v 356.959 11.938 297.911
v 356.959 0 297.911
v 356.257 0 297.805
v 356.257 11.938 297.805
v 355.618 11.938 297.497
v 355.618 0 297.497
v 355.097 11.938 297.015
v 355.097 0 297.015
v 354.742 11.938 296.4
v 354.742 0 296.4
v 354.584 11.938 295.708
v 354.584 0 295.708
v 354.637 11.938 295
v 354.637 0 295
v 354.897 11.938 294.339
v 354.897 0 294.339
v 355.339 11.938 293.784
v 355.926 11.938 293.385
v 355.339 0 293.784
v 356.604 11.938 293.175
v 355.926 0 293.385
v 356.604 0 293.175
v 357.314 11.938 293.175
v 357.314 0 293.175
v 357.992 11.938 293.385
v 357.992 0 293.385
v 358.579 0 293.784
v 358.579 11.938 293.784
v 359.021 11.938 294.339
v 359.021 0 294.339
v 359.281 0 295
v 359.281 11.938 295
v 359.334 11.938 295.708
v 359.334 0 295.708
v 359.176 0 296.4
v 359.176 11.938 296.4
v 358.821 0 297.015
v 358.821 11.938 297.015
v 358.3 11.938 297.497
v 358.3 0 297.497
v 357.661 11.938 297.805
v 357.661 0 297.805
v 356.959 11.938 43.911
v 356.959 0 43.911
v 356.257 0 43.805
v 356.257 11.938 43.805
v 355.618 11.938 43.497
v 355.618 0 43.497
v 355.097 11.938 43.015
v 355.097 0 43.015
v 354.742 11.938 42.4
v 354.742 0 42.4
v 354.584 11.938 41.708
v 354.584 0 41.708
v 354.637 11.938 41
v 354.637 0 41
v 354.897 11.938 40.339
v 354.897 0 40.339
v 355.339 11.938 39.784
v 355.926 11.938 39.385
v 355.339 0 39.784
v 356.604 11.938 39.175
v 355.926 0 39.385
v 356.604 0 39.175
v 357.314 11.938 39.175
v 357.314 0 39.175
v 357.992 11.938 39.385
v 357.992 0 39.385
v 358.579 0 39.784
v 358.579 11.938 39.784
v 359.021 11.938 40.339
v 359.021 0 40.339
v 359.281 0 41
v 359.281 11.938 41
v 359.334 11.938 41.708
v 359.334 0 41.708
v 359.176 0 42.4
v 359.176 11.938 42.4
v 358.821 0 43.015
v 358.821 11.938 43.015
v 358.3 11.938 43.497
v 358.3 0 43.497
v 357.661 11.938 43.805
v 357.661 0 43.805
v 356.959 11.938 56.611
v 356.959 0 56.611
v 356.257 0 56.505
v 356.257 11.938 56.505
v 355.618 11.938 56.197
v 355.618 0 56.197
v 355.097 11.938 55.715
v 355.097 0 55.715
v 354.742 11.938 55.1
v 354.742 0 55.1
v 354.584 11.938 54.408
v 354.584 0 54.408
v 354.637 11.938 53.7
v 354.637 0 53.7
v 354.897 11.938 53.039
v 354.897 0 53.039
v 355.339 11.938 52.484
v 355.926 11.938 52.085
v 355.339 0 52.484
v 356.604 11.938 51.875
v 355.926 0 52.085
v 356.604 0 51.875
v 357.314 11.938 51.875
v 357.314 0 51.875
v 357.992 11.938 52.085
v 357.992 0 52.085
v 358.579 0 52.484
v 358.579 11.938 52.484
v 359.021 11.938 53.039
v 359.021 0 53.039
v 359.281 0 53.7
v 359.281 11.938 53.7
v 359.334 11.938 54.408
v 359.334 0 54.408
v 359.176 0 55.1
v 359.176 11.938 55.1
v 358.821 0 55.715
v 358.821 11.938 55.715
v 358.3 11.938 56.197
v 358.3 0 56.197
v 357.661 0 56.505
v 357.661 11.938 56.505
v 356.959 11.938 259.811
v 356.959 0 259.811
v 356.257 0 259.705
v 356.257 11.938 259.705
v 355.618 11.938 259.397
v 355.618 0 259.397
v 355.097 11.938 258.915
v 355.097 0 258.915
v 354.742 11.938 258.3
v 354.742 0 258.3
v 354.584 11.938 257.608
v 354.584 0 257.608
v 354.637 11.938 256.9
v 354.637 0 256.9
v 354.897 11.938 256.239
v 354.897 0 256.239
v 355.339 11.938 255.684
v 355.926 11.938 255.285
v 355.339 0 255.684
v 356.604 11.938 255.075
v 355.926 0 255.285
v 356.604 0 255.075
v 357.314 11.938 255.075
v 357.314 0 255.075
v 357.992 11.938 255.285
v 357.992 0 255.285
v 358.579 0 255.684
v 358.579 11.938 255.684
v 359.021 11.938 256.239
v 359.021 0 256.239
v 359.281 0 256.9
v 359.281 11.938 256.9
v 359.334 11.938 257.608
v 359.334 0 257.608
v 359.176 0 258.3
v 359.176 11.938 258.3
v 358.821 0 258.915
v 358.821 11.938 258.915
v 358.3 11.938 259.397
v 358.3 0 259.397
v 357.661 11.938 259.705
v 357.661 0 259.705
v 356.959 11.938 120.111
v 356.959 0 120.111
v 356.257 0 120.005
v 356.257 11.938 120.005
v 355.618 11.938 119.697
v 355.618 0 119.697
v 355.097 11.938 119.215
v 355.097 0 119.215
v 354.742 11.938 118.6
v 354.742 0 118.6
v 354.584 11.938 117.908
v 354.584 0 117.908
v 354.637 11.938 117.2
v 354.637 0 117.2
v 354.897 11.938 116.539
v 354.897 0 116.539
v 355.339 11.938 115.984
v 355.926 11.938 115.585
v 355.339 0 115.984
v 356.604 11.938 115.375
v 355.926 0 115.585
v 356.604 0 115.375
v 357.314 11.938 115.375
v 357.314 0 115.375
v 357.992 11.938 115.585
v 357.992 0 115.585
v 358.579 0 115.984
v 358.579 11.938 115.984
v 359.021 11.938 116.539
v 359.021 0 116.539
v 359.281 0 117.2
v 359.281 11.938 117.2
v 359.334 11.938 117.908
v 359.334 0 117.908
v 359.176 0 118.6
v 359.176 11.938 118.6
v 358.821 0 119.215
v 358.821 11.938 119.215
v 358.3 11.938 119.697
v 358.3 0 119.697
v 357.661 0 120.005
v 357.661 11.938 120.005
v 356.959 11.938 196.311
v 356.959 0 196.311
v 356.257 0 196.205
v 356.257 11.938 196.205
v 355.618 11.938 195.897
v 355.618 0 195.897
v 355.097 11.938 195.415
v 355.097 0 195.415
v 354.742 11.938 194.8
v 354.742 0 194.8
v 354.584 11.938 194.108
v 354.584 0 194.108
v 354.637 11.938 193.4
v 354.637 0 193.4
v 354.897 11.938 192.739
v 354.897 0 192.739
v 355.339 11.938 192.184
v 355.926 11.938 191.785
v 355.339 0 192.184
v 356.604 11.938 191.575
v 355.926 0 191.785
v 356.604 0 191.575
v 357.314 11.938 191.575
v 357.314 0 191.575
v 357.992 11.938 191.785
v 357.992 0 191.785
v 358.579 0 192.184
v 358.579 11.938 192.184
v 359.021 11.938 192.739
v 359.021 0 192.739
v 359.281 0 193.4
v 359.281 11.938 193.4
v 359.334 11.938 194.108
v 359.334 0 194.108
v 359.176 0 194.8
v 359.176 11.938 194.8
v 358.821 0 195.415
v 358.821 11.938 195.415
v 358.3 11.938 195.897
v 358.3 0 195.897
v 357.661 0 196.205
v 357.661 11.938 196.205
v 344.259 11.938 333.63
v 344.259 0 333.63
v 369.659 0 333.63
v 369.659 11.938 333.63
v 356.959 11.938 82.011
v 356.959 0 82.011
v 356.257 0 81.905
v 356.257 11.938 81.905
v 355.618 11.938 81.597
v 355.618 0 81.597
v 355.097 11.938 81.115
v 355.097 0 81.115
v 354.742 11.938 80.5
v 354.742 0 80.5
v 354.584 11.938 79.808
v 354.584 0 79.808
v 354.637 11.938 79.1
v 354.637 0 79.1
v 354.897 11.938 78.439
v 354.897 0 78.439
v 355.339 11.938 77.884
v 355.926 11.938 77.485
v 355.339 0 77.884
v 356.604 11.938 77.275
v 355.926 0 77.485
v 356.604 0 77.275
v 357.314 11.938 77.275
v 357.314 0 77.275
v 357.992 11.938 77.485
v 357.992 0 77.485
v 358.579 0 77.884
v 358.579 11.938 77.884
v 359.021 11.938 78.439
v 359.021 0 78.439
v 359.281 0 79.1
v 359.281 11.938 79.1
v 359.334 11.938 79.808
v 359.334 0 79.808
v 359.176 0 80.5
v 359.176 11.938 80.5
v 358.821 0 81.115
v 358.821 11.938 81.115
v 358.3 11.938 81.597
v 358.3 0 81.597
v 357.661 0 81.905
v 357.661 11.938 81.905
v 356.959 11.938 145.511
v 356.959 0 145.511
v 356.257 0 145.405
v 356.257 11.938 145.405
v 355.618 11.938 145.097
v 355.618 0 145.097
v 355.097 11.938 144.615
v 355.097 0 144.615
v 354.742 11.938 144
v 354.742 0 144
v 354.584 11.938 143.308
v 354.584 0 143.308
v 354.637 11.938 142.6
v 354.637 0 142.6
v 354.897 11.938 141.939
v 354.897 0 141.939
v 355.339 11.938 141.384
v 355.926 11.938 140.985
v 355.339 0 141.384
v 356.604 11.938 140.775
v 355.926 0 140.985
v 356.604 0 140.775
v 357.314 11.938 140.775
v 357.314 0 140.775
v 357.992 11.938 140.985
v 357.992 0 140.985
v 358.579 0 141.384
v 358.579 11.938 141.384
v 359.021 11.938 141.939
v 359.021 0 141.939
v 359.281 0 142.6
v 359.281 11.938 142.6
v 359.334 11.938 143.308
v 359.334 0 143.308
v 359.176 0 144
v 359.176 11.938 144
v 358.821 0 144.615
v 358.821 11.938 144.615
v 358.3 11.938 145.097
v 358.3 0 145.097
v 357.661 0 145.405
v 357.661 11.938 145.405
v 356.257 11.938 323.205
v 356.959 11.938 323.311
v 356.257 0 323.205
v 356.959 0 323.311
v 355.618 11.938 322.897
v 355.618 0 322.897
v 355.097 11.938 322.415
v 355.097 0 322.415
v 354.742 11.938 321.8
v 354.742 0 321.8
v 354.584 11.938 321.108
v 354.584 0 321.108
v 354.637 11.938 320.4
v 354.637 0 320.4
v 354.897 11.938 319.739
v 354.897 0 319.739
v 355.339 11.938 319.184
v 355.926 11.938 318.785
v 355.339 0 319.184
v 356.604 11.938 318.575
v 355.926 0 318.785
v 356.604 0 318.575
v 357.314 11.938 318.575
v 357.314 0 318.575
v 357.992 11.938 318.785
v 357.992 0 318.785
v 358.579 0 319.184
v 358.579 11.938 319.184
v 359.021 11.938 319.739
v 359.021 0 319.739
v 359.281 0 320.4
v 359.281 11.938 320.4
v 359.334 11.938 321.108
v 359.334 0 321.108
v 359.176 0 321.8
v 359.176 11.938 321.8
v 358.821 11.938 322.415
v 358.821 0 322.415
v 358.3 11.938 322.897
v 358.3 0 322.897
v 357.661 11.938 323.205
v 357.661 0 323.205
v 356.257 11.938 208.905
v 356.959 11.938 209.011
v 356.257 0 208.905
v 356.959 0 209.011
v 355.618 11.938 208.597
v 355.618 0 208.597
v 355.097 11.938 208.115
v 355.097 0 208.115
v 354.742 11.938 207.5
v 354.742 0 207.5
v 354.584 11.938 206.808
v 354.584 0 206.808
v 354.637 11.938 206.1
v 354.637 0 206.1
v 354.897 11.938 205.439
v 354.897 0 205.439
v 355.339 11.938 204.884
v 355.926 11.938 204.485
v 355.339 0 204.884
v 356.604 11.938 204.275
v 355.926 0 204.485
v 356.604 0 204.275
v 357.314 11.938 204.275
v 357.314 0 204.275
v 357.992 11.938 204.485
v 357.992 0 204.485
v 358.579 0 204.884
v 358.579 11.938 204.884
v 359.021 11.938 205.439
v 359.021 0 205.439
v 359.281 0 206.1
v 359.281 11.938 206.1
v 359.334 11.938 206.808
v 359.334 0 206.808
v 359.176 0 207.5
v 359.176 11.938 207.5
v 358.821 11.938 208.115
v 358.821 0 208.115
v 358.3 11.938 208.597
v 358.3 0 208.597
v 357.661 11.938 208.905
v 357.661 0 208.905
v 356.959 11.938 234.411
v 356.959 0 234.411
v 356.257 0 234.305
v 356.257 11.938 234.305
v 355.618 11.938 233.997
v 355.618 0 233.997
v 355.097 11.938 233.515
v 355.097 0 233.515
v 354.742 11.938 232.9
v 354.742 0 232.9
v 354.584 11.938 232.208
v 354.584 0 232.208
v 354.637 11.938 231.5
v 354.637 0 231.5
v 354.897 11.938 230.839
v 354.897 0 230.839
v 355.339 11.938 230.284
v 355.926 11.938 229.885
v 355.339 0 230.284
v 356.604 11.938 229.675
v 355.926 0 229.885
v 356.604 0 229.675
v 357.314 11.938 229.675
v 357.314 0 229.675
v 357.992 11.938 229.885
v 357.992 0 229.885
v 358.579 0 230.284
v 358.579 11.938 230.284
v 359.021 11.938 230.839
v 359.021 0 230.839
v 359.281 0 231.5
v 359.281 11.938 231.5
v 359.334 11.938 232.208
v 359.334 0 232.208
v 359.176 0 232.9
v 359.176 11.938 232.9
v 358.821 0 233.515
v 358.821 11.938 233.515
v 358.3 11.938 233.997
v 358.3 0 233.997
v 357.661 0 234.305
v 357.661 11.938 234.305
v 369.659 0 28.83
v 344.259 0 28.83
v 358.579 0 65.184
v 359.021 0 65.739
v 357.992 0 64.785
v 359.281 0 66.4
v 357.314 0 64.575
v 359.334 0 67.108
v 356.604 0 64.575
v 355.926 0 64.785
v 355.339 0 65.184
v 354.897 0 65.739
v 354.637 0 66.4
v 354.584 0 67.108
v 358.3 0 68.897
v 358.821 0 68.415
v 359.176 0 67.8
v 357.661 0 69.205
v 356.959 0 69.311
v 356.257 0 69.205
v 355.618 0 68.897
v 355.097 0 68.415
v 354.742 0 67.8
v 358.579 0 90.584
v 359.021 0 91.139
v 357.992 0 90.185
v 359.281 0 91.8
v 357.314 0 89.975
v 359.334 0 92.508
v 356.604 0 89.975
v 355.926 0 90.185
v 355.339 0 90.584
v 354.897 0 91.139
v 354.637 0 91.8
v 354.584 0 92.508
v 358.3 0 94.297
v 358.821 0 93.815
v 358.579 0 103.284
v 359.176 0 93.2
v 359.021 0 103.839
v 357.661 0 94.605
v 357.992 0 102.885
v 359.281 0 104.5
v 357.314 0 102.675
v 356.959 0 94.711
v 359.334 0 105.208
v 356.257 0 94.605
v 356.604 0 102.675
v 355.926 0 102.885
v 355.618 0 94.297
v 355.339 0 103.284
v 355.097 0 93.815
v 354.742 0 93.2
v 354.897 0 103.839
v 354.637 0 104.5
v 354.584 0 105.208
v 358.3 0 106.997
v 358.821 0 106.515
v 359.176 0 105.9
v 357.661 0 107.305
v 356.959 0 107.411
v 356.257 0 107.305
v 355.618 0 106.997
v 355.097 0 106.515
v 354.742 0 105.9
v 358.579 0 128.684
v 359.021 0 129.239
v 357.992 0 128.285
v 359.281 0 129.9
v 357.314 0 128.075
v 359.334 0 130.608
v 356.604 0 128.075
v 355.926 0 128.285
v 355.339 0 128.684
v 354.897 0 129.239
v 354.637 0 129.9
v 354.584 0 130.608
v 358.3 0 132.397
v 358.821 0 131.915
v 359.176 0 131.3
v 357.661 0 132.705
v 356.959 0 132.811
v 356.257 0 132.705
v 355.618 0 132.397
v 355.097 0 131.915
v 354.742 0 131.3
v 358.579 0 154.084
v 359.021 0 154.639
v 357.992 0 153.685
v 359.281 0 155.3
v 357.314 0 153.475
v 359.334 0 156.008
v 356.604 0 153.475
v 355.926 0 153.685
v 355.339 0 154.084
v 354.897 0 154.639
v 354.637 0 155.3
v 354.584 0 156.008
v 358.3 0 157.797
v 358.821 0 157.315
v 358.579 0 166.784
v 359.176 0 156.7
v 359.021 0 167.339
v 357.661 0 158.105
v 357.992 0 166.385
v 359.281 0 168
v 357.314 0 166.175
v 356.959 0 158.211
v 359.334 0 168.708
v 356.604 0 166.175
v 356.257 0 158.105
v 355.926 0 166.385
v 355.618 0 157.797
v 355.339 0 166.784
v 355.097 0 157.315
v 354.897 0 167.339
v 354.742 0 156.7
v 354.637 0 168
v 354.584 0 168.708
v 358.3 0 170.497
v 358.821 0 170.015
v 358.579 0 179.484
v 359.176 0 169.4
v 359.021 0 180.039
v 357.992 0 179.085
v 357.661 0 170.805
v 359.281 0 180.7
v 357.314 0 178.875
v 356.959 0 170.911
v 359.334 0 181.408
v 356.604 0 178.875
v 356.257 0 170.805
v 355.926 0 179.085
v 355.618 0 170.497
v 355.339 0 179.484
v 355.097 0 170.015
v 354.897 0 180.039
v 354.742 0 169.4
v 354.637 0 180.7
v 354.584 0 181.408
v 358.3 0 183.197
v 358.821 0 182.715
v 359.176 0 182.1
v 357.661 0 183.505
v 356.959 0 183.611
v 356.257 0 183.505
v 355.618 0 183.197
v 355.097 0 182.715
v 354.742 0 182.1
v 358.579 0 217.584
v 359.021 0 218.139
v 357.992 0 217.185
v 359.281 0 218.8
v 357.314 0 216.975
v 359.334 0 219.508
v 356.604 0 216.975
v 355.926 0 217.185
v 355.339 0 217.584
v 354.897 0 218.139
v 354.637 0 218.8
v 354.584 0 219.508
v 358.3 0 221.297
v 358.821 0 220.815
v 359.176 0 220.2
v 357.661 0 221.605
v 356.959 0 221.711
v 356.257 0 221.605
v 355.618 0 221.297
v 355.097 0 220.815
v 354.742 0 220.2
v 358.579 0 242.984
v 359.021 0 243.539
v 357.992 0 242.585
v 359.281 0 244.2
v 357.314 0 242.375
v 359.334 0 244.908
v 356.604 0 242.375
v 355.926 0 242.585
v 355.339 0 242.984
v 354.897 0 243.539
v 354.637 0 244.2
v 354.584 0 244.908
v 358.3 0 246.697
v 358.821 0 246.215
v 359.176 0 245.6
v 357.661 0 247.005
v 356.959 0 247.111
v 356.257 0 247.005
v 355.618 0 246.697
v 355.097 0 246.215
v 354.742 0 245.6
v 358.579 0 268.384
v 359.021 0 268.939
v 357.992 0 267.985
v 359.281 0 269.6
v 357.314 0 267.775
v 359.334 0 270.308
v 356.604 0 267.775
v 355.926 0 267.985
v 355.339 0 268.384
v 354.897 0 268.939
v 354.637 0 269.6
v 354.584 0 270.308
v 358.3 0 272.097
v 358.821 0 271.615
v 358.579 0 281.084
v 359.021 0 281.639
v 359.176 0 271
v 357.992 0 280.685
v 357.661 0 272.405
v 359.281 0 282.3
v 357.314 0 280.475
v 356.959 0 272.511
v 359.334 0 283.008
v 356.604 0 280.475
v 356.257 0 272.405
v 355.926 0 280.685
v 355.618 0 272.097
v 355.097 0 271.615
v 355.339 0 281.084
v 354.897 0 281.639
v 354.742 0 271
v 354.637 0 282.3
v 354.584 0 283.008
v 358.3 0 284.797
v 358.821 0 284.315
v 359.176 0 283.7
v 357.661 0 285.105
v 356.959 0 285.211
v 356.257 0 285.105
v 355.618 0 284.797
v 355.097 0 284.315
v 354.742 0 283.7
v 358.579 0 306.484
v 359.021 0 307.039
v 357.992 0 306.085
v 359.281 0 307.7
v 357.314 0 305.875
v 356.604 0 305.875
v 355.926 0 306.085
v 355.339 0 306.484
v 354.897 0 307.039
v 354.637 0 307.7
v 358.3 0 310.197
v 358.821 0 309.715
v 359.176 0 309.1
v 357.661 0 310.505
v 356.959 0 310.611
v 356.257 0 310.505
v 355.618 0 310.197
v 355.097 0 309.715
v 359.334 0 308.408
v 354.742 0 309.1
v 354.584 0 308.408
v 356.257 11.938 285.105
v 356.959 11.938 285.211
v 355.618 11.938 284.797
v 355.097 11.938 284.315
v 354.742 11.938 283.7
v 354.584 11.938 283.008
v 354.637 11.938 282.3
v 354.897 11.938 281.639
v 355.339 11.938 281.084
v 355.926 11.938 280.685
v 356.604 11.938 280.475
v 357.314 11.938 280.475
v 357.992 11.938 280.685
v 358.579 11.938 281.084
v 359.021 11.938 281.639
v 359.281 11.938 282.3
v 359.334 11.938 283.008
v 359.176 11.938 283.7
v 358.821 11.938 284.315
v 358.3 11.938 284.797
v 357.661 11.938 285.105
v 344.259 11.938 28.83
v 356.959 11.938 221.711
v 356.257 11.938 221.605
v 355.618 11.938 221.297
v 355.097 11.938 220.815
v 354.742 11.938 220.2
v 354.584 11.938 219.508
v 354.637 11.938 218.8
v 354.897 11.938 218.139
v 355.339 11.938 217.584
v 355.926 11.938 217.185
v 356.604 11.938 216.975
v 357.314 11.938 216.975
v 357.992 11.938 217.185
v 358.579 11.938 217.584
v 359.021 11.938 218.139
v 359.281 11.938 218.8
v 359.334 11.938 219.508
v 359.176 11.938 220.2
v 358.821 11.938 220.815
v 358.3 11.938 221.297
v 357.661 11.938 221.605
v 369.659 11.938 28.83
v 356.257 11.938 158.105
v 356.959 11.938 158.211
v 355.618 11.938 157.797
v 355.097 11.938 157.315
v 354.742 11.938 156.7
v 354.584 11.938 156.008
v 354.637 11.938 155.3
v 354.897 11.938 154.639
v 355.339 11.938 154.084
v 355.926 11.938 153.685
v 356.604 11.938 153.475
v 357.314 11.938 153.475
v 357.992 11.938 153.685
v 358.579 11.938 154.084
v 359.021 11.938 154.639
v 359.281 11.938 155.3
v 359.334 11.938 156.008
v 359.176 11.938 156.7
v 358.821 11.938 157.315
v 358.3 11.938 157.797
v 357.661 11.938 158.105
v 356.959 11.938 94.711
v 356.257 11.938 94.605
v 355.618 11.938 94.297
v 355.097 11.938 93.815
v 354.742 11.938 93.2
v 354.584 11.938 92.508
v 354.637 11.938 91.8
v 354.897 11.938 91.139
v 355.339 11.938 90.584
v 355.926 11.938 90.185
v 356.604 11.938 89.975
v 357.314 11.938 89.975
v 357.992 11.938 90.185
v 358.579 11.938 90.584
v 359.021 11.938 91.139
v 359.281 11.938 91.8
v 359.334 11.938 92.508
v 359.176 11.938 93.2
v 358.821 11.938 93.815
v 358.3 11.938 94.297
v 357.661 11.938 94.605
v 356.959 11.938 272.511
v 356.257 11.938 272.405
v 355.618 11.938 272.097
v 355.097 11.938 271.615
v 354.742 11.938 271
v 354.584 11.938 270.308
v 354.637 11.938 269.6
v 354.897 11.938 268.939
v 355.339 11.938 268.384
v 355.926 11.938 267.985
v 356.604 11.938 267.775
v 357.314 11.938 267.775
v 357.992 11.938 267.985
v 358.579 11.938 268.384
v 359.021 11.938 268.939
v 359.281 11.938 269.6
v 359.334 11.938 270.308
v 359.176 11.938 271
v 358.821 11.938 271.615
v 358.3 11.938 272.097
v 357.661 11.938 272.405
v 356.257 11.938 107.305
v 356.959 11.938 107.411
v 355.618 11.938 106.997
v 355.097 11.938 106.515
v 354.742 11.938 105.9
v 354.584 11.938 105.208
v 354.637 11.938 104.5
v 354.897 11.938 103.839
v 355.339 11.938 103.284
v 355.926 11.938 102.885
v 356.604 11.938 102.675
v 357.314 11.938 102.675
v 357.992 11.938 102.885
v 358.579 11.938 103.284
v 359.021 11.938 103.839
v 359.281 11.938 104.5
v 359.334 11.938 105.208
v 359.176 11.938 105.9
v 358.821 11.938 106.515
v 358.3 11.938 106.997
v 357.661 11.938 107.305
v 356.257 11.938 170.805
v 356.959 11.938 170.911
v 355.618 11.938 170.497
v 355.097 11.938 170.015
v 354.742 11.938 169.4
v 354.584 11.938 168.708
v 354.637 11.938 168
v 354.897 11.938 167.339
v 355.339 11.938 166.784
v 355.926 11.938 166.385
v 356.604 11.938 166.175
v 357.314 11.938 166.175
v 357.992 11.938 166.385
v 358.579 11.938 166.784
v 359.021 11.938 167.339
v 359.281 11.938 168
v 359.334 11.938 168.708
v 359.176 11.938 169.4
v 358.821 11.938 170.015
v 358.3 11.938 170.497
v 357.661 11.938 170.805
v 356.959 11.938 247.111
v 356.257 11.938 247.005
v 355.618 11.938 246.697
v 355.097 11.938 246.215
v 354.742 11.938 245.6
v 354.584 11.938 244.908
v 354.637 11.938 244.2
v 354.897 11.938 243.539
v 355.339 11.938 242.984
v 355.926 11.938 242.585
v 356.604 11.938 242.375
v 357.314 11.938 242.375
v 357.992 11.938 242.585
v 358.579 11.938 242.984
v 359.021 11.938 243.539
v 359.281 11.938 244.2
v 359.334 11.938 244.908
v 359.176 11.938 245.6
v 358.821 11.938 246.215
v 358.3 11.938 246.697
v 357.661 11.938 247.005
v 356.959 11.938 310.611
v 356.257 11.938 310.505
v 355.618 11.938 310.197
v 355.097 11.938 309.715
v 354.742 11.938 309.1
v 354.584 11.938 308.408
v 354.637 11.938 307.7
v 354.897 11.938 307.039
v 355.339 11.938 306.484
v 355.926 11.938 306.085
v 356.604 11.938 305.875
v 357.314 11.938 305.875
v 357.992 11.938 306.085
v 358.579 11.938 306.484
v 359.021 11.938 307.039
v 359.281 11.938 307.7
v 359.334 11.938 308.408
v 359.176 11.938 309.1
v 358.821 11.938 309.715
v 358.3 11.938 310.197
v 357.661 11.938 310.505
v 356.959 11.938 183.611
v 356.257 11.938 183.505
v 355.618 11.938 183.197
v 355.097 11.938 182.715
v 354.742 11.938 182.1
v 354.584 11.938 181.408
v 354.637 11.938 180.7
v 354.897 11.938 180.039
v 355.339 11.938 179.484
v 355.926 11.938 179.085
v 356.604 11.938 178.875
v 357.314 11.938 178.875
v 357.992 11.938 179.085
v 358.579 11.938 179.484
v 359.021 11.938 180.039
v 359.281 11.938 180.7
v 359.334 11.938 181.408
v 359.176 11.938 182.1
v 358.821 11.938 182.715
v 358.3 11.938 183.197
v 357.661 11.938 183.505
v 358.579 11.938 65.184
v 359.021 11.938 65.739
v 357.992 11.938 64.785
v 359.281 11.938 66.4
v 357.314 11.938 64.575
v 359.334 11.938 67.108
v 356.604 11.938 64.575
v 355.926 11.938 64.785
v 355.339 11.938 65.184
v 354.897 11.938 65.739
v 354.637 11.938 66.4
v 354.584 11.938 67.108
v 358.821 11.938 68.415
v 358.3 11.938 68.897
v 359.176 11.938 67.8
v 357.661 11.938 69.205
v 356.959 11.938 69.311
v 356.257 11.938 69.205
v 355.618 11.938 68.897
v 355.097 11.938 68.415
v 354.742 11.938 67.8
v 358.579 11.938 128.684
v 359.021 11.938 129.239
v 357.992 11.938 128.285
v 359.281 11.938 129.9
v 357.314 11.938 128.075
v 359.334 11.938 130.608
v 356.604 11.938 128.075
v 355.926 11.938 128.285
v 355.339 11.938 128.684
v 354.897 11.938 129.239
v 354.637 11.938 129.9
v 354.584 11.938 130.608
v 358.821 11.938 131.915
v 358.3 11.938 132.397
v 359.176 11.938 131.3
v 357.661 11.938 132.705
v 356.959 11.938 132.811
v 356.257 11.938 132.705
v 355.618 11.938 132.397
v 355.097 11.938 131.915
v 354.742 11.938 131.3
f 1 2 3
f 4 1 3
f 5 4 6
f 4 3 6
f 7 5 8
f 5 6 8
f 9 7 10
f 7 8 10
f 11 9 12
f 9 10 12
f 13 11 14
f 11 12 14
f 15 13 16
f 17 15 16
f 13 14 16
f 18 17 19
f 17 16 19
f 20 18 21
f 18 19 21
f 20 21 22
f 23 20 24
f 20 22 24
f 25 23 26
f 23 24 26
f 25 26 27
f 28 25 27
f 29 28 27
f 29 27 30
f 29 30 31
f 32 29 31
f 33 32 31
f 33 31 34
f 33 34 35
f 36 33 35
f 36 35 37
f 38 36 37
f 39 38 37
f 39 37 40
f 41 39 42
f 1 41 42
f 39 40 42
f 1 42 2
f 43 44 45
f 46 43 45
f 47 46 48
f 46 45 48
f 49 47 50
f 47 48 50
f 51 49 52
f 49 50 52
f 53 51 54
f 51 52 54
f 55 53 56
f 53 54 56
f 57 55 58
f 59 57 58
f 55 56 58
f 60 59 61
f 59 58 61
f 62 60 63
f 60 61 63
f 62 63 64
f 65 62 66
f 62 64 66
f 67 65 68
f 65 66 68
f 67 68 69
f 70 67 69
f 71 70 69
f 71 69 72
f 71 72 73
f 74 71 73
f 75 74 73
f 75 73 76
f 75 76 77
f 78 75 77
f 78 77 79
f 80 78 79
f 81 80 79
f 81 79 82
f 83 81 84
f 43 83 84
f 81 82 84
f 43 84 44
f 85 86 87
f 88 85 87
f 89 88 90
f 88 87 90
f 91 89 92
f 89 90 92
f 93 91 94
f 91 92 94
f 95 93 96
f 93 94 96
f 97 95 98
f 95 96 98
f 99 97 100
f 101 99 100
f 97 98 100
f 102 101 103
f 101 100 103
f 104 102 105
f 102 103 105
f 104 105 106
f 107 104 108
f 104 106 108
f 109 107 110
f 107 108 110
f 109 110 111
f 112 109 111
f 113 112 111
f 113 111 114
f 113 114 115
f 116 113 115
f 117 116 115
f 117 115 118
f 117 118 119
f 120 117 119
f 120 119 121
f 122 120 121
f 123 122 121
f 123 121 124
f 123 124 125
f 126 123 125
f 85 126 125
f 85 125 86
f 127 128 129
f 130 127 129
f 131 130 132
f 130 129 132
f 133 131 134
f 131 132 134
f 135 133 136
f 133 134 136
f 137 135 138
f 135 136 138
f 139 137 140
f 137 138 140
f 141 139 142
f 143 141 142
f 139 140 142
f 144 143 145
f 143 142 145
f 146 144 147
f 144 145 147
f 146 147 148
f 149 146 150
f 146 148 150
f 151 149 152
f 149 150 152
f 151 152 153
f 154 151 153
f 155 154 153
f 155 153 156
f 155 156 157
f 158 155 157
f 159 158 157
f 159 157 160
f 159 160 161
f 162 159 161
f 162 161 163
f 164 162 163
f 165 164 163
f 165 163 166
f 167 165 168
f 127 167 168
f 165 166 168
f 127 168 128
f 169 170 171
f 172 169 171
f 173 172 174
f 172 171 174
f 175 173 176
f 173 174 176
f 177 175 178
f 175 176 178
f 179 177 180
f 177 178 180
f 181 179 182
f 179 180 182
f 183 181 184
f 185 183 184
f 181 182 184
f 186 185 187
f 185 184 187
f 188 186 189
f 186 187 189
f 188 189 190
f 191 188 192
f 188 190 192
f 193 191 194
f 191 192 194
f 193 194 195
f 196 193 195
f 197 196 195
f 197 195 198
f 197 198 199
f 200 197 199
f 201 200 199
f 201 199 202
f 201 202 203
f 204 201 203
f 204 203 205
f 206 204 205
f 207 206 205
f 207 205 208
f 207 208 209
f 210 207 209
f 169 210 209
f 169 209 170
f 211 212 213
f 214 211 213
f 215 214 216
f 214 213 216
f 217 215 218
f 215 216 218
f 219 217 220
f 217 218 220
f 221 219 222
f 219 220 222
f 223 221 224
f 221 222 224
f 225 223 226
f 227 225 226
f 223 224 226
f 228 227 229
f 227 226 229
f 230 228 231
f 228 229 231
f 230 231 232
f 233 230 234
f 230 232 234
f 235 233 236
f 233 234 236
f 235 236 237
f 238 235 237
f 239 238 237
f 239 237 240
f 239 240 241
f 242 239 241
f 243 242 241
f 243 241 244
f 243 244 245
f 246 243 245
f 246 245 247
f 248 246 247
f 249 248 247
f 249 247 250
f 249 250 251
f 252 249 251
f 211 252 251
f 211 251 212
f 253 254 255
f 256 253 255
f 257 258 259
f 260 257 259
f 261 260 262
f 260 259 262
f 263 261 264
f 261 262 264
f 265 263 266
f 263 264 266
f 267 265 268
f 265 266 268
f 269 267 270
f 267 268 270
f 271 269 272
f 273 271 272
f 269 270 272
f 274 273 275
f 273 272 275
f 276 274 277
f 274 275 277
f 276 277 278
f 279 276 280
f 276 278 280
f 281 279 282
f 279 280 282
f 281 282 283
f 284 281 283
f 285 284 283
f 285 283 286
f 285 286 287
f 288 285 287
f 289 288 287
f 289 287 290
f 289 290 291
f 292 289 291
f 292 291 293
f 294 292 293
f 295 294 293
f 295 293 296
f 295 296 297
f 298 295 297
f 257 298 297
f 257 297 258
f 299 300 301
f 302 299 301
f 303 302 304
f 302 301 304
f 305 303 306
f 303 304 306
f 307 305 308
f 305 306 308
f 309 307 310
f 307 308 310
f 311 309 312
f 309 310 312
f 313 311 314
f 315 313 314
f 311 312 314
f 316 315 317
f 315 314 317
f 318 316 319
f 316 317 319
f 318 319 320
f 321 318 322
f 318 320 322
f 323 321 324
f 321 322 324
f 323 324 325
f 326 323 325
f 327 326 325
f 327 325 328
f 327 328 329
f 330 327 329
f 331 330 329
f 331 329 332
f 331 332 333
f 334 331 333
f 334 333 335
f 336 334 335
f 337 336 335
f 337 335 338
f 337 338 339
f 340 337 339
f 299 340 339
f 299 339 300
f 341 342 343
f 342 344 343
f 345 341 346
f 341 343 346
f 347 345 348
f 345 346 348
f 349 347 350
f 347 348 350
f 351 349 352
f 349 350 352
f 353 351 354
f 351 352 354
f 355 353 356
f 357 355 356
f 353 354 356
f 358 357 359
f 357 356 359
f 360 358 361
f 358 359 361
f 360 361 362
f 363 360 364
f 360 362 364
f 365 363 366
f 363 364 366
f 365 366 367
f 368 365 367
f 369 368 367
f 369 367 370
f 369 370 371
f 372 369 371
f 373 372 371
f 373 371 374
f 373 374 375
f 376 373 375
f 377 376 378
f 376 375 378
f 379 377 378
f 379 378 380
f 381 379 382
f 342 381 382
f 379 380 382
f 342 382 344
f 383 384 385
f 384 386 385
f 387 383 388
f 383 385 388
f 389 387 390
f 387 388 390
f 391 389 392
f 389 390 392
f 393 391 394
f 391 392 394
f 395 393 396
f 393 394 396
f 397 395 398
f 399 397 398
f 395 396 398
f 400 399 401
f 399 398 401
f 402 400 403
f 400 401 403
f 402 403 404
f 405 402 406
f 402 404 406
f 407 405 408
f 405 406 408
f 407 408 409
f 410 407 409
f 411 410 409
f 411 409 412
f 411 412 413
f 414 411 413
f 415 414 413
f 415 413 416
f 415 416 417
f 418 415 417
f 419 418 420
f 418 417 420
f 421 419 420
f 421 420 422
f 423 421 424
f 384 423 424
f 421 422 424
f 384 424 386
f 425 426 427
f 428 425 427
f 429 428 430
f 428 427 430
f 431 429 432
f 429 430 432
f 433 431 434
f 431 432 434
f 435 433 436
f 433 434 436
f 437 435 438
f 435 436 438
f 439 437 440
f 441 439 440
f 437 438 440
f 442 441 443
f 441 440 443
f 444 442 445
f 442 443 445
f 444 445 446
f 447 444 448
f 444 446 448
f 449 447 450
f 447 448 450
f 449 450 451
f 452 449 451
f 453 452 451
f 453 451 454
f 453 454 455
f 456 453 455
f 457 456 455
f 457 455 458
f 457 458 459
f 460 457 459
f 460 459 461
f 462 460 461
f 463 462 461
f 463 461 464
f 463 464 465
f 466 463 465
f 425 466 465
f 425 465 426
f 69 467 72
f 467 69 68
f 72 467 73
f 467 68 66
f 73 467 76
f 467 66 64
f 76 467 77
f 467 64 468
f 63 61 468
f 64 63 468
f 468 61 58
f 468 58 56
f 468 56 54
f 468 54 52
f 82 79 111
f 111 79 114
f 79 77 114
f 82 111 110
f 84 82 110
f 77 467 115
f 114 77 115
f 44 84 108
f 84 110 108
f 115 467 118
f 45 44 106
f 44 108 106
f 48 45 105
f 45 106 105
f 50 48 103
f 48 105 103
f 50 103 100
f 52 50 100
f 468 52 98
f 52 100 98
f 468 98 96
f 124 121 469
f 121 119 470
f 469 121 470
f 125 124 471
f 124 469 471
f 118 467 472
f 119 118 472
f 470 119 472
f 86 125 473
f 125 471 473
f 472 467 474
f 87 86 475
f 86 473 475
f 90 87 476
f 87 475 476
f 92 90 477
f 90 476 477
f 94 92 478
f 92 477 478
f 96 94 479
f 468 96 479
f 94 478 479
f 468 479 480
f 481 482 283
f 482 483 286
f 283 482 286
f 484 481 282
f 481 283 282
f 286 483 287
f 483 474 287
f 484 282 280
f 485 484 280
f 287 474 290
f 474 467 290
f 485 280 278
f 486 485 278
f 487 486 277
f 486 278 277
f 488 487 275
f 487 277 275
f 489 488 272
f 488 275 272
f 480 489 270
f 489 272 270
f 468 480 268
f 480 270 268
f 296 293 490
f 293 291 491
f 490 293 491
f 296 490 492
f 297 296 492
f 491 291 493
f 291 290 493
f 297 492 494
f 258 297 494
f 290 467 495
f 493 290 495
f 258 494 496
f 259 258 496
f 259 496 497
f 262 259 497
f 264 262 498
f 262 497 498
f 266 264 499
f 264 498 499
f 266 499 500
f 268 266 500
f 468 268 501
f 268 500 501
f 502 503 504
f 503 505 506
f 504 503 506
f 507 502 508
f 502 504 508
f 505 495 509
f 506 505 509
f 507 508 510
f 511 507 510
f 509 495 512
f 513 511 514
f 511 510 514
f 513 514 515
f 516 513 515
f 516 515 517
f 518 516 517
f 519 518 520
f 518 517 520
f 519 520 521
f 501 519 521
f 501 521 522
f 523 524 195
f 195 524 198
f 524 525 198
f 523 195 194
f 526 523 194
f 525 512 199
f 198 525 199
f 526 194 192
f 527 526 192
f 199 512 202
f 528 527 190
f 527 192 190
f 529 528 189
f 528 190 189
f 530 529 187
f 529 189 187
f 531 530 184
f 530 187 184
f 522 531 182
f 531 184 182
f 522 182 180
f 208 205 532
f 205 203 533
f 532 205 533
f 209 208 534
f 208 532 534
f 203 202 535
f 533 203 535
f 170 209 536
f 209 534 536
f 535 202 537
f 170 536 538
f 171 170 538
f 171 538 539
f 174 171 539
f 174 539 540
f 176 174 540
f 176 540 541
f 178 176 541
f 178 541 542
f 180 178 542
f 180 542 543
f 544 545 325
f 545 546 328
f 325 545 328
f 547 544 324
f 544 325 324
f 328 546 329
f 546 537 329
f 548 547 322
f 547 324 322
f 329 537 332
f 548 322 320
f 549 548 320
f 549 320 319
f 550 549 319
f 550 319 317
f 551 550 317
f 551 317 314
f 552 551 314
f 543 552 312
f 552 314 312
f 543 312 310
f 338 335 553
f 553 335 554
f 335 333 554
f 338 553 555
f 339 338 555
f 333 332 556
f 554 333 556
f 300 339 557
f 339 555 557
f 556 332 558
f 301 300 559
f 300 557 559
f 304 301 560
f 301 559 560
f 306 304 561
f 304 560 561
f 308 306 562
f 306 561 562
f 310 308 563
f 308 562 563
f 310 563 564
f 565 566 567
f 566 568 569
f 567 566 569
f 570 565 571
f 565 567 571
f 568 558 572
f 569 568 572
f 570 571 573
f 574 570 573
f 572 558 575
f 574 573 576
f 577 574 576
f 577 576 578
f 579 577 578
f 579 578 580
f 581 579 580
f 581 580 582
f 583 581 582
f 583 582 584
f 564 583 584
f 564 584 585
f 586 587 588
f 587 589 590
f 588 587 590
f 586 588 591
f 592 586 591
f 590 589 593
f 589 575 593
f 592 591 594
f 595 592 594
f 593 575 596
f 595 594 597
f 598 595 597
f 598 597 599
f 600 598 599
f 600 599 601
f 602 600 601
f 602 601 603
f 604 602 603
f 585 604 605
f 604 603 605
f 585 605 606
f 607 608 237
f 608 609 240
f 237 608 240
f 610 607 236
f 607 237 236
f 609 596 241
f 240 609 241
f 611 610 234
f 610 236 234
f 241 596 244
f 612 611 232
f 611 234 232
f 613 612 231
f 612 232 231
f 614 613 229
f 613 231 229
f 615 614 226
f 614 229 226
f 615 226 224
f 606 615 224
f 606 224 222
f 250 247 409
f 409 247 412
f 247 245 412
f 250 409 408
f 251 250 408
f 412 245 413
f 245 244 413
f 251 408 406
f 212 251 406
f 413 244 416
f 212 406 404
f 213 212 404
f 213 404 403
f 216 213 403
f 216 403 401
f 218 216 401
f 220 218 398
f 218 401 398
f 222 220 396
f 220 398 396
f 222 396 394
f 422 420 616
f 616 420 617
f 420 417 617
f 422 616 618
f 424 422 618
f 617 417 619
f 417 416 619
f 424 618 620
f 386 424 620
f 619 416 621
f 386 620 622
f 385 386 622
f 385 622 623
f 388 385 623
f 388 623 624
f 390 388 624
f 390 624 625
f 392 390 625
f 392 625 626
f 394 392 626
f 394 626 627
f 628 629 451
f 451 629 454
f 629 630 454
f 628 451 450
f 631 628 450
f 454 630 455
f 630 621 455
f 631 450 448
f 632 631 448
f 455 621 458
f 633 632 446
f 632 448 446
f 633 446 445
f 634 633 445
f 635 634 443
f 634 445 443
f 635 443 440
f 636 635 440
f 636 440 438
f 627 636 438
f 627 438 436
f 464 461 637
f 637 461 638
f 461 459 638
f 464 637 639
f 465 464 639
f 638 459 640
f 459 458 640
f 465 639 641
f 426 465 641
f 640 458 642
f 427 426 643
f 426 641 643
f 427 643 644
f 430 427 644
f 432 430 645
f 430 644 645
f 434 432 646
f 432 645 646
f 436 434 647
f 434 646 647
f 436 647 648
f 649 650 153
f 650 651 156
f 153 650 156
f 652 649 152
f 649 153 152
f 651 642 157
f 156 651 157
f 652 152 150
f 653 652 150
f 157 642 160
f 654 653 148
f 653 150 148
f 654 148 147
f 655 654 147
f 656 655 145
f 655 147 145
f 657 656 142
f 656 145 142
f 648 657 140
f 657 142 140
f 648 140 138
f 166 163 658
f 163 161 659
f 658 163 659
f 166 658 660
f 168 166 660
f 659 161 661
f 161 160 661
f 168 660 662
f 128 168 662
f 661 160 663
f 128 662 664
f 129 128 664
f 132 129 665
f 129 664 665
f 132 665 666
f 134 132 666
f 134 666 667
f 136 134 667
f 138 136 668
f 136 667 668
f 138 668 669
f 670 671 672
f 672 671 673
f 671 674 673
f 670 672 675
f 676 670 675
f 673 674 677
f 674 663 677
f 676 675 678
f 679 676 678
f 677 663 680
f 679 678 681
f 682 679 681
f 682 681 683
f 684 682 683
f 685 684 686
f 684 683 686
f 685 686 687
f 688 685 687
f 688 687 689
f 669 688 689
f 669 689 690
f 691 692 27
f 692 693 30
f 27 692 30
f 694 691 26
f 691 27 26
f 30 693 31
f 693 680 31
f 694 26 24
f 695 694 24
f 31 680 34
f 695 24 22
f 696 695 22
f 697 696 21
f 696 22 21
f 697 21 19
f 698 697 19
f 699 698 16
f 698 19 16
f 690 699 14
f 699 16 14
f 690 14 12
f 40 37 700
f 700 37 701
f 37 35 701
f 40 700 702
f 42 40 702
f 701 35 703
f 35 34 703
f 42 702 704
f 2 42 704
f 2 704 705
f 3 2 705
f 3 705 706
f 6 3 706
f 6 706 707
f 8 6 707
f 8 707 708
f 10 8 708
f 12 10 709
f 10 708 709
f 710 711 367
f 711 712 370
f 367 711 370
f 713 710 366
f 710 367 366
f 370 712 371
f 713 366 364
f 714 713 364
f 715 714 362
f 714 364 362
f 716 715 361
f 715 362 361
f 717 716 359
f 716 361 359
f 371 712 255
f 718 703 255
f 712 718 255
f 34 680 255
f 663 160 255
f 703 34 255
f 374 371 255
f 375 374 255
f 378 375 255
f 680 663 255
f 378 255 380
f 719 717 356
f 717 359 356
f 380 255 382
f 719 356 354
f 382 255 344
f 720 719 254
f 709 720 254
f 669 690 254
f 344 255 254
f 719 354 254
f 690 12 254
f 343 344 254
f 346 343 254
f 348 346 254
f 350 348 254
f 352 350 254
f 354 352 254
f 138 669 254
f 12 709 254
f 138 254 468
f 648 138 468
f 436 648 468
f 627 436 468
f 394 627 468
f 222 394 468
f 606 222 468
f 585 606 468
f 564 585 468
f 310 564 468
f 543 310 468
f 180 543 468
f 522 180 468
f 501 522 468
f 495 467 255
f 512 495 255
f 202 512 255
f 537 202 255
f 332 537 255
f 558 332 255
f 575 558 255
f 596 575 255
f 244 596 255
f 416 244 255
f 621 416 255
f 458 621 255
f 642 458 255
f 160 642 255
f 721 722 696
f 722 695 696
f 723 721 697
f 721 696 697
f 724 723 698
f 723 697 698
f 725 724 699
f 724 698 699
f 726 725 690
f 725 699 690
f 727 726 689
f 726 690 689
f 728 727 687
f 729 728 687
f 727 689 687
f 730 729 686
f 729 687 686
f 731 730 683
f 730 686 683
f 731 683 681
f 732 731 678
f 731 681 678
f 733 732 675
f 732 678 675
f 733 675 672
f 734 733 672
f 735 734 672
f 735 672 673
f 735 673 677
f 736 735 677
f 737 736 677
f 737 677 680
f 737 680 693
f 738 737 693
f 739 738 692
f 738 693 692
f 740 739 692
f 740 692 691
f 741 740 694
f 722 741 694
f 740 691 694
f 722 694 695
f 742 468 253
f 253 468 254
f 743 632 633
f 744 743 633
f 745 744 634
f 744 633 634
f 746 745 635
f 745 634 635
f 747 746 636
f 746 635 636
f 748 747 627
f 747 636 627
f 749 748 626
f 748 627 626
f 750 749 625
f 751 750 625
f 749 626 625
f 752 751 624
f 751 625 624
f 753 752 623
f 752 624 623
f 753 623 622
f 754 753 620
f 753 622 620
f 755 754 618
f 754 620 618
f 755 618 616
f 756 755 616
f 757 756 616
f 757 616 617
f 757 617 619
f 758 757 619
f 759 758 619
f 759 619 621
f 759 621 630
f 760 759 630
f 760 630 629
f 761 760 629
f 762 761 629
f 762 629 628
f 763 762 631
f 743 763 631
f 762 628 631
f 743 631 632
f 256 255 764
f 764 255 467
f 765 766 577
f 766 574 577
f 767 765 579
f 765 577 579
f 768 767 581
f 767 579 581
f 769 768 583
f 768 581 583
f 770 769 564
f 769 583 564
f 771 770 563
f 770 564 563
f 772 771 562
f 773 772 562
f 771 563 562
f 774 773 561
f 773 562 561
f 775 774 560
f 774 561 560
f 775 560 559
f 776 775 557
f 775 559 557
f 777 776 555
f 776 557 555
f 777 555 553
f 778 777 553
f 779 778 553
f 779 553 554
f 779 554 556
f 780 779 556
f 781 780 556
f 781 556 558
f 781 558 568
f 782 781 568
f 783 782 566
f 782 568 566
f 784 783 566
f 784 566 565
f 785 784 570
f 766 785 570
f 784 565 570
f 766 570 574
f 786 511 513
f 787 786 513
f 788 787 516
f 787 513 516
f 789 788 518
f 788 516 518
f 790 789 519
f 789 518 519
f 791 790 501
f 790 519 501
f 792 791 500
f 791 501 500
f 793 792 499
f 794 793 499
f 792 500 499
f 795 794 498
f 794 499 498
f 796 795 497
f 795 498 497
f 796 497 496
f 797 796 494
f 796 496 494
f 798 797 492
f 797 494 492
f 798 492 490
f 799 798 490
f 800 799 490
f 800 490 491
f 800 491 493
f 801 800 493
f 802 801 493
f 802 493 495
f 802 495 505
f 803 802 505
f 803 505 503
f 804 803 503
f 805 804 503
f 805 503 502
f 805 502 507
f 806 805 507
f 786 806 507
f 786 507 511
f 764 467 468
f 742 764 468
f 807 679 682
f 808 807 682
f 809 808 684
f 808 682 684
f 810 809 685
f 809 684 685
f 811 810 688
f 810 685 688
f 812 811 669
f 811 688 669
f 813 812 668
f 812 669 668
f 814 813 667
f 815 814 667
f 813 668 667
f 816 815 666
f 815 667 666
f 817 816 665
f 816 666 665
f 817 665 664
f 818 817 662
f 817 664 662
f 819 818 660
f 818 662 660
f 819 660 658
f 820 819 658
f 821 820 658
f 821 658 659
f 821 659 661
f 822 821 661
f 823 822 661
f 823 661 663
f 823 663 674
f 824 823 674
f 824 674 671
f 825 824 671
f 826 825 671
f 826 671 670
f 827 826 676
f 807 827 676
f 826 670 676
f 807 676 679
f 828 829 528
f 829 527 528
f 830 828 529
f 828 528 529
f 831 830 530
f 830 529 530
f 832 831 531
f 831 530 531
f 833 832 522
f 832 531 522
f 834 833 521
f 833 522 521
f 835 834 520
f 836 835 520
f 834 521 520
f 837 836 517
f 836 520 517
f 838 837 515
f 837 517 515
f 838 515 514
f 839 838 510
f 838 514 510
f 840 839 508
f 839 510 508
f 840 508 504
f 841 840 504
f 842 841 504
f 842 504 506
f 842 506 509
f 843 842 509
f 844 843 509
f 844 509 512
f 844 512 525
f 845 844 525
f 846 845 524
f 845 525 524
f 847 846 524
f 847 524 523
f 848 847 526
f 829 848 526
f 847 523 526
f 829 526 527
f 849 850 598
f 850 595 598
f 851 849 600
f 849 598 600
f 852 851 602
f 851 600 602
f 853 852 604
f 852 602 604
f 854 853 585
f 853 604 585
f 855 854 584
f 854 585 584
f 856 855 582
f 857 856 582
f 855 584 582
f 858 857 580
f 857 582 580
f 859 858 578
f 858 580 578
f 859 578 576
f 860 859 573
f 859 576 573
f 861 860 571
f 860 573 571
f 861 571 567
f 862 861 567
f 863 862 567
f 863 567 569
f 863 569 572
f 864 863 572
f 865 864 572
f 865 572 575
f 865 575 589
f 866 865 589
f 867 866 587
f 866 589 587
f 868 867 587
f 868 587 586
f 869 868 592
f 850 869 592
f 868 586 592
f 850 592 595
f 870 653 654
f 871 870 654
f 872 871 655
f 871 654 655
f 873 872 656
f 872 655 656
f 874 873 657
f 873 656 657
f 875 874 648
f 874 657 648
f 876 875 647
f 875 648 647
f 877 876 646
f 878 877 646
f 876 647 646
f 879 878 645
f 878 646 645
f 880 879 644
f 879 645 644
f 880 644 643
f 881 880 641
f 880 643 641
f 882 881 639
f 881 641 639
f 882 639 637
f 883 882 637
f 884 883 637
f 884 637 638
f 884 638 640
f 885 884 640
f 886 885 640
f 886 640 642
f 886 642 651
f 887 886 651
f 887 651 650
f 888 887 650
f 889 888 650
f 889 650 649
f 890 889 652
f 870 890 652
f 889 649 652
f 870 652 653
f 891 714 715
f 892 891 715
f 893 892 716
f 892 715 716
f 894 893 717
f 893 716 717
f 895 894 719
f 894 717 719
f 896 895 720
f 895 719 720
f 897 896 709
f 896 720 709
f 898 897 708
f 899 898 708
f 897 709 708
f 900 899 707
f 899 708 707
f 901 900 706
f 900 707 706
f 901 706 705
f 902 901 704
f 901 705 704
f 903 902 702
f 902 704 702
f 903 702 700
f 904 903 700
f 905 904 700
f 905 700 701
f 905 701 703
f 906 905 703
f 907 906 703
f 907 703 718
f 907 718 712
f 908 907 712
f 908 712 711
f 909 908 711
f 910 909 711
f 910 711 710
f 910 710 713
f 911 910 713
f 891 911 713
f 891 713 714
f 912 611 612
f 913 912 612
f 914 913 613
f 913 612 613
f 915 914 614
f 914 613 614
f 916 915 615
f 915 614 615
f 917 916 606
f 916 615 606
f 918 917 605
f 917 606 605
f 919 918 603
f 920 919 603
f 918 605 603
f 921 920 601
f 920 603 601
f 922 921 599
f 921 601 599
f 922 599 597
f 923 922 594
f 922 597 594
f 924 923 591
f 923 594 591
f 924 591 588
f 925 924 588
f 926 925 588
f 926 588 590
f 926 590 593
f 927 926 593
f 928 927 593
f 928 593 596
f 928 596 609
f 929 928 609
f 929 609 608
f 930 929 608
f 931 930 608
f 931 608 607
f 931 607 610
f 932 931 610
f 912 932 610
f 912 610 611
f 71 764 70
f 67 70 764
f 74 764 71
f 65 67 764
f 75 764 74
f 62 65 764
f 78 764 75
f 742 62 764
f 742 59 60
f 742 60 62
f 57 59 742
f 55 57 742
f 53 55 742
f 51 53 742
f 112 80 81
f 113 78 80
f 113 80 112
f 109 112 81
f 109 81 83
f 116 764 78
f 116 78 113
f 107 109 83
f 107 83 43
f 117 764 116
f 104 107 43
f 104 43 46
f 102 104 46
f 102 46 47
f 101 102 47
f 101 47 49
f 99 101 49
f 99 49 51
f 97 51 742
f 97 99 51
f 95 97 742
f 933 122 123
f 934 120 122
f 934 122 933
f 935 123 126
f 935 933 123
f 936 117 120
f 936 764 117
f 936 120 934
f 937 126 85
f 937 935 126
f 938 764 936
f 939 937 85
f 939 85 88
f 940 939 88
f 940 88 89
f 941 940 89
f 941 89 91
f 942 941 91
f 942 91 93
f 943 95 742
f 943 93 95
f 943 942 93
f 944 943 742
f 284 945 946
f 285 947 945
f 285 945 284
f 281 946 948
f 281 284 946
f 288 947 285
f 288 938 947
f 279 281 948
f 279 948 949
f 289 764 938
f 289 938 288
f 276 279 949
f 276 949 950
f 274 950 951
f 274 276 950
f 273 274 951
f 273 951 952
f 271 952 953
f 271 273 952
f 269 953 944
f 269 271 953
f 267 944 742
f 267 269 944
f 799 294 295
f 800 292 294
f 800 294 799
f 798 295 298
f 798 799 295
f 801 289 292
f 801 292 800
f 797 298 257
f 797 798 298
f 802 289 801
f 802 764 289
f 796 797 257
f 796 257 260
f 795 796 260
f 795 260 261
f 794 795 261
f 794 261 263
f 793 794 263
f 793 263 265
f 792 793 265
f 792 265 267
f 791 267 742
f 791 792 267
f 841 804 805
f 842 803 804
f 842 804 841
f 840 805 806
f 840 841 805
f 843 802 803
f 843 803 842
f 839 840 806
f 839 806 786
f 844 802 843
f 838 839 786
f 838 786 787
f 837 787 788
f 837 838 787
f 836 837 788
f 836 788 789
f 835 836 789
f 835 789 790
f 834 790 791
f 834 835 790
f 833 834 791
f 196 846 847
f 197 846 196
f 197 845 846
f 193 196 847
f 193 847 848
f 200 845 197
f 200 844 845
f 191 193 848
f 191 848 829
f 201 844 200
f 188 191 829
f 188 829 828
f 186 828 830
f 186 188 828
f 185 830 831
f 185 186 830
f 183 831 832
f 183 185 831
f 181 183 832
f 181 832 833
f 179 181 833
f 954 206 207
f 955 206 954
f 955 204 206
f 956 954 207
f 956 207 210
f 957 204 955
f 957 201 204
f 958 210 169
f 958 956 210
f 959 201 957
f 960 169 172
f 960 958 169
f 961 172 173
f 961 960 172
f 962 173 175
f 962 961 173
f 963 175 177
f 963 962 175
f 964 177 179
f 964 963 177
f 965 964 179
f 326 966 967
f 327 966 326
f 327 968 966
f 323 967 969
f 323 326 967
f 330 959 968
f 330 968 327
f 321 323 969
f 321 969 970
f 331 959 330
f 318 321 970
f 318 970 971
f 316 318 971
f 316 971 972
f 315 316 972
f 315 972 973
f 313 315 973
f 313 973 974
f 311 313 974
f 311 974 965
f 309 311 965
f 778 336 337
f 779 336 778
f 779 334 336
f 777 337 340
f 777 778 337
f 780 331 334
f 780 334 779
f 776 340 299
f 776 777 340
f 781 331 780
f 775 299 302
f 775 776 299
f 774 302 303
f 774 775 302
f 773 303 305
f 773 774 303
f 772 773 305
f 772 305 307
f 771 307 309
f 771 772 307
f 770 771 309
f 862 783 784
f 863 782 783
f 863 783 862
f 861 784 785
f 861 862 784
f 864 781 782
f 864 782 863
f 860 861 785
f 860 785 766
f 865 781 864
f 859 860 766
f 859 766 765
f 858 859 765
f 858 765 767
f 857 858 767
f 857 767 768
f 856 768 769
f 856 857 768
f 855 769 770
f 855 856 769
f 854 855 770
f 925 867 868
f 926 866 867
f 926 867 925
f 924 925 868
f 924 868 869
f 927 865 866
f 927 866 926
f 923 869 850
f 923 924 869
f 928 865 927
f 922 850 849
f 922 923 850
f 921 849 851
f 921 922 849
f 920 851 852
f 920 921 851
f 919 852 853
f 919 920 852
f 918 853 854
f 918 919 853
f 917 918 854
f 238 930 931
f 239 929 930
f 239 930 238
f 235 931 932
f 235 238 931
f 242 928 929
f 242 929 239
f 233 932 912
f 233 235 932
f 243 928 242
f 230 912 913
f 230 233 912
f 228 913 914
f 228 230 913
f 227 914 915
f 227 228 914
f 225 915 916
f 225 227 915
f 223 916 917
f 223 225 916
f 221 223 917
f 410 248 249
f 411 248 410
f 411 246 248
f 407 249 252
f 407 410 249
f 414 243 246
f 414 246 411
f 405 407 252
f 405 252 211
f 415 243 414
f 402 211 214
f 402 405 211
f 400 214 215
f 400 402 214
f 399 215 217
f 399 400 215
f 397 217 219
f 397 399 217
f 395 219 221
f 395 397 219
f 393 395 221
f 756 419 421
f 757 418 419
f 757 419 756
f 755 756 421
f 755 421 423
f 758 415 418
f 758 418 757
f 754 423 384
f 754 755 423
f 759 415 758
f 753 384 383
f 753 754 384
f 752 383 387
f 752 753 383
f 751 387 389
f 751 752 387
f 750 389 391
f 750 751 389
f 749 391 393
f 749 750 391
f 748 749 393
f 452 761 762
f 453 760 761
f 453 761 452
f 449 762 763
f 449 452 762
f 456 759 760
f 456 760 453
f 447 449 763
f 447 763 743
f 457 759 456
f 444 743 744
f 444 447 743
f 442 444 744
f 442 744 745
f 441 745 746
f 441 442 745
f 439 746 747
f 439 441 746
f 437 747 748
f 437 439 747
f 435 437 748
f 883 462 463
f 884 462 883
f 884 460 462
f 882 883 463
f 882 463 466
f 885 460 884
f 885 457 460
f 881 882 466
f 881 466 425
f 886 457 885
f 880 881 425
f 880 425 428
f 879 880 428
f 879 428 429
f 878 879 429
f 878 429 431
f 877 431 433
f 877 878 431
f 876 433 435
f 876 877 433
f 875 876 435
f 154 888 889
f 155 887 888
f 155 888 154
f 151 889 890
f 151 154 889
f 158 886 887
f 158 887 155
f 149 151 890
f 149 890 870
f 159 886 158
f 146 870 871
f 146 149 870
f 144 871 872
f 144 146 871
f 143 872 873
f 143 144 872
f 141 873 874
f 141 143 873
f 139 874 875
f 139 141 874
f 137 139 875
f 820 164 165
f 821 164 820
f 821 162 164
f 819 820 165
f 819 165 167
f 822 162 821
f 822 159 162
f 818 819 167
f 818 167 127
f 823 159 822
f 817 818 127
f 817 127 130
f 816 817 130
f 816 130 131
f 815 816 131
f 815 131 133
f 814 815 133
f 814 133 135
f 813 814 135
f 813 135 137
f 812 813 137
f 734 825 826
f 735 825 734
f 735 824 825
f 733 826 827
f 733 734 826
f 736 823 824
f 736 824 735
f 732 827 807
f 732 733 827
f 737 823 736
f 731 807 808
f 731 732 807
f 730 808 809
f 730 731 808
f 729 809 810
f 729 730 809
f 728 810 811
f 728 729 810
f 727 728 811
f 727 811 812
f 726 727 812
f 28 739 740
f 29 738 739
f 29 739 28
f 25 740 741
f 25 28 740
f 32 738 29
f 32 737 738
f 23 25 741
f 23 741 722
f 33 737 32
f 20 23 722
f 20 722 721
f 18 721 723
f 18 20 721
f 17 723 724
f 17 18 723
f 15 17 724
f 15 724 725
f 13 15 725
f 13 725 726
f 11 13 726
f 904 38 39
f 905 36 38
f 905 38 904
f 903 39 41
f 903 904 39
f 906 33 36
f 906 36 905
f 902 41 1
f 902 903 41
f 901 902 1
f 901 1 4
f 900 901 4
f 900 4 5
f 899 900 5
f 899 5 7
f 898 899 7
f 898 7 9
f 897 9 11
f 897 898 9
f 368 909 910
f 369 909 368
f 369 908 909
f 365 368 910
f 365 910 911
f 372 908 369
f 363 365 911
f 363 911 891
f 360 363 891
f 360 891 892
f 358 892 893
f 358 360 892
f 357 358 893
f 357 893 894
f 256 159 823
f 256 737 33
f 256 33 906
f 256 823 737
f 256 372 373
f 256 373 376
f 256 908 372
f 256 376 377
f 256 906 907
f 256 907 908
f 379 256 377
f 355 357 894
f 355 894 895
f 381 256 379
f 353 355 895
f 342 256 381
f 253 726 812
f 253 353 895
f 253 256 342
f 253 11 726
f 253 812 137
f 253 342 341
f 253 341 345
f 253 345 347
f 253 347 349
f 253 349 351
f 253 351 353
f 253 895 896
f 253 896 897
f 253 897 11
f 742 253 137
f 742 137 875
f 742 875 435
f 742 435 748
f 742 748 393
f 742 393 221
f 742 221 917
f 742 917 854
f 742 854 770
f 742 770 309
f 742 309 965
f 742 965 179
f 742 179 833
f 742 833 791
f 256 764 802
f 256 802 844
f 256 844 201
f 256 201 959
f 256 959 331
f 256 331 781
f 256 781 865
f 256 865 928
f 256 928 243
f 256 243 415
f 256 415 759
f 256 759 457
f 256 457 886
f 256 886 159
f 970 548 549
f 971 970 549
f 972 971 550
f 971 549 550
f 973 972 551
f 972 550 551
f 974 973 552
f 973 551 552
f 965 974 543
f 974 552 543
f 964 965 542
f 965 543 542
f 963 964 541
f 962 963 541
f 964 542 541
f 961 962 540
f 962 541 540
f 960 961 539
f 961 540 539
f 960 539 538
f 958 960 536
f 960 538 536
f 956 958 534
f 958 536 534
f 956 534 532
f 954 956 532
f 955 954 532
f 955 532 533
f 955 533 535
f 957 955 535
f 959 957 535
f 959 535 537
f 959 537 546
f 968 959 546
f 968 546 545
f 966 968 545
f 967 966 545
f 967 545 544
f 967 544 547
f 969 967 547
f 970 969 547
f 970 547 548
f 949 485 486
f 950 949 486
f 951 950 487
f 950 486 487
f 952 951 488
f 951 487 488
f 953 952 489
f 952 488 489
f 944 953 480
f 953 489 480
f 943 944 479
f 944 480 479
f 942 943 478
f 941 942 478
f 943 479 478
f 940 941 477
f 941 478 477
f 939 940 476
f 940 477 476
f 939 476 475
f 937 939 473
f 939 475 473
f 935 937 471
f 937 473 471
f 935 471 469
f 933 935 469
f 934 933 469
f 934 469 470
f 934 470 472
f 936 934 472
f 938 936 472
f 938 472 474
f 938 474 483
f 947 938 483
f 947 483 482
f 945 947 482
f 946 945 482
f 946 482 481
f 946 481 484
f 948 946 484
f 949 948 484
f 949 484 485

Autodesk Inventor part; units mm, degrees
ref_plane "YZ Plane" through (0, 0, 0) normal (1, 0, 0) x (0, 1, 0)
ref_plane "XZ Plane" through (0, 0, 0) normal (0, 1, 0) x (-1, 0, 0)
ref_plane "XY Plane" through (0, 0, 0) normal (0, 0, 1) x (1, 0, 0)
sketch "Sketch1" plane through (0, 0, 0) normal (0, 1, 0) x (-1, 0, 0)
  line L0 (-344.259, 333.63) -> (-369.659, 333.63)
  line L1 (-369.659, 333.63) -> (-369.659, 28.83)
  line L2 (-369.659, 28.83) -> (-344.259, 28.83)
  line L3 (-344.259, 28.83) -> (-344.259, 333.63)
  point P0 (0, 0)
  dimension "d0" = 25.4
  dimension "d1" = 304.8
extrude "Extrusion1" add sketch "Sketch1" along normal blind 11.938
sketch "Sketch2" plane through (0, 11.938, 0) normal (0, 1, 0) x (1, 0, 0)
  line L0 (369.659, -28.83) -> (344.259, -28.83) projected
  line L1 (356.959, -28.83) -> (356.959, -333.63) construction
  circle A0 centre (356.959, -41.53) radius 2.3813
  circle A1 centre (356.959, -54.23) radius 2.3813
  circle A2 centre (356.959, -66.93) radius 2.3813
  circle A3 centre (356.959, -79.63) radius 2.3813
  circle A4 centre (356.959, -92.33) radius 2.3813
  circle A5 centre (356.959, -105.03) radius 2.3813
  circle A6 centre (356.959, -117.73) radius 2.3813
  circle A7 centre (356.959, -130.43) radius 2.3813
  circle A8 centre (356.959, -143.13) radius 2.3813
  circle A9 centre (356.959, -155.83) radius 2.3813
  circle A10 centre (356.959, -168.53) radius 2.3813
  circle A11 centre (356.959, -181.23) radius 2.3813
  circle A12 centre (356.959, -193.93) radius 2.3813
  circle A13 centre (356.959, -206.63) radius 2.3813
  circle A14 centre (356.959, -219.33) radius 2.3813
  circle A15 centre (356.959, -232.03) radius 2.3813
  circle A16 centre (356.959, -244.73) radius 2.3813
  circle A17 centre (356.959, -257.43) radius 2.3813
  circle A18 centre (356.959, -270.13) radius 2.3813
  circle A19 centre (356.959, -282.83) radius 2.3813
  circle A20 centre (356.959, -295.53) radius 2.3813
  circle A21 centre (356.959, -308.23) radius 2.3813
  circle A22 centre (356.959, -320.93) radius 2.3813
  point P0 (0, 0)
  dimension "d20" = 4.7625
  dimension "d21" = 12.7
  dimension "d24" = 12.7
hole "Hole1" at (356.959, 11.938, 41.53) at (356.959, 11.938, 54.23) at (356.959, 11.938, 66.93) at (356.959, 11.938, 79.63) at (356.959, 11.938, 92.33) at (356.959, 11.938, 105.03) at (356.959, 11.938, 117.73) at (356.959, 11.938, 130.43) at (356.959, 11.938, 143.13) at (356.959, 11.938, 155.83) at (356.959, 11.938, 168.53) at (356.959, 11.938, 181.23) at (356.959, 11.938, 193.93) at (356.959, 11.938, 206.63) at (356.959, 11.938, 219.33) at (356.959, 11.938, 232.03) at (356.959, 11.938, 244.73) at (356.959, 11.938, 257.43) at (356.959, 11.938, 270.13) at (356.959, 11.938, 282.83) at (356.959, 11.938, 295.53) at (356.959, 11.938, 308.23) at (356.959, 11.938, 320.93) direction (0, -1, 0) diameter 4.7625 end through all
properties part number "linkage"
